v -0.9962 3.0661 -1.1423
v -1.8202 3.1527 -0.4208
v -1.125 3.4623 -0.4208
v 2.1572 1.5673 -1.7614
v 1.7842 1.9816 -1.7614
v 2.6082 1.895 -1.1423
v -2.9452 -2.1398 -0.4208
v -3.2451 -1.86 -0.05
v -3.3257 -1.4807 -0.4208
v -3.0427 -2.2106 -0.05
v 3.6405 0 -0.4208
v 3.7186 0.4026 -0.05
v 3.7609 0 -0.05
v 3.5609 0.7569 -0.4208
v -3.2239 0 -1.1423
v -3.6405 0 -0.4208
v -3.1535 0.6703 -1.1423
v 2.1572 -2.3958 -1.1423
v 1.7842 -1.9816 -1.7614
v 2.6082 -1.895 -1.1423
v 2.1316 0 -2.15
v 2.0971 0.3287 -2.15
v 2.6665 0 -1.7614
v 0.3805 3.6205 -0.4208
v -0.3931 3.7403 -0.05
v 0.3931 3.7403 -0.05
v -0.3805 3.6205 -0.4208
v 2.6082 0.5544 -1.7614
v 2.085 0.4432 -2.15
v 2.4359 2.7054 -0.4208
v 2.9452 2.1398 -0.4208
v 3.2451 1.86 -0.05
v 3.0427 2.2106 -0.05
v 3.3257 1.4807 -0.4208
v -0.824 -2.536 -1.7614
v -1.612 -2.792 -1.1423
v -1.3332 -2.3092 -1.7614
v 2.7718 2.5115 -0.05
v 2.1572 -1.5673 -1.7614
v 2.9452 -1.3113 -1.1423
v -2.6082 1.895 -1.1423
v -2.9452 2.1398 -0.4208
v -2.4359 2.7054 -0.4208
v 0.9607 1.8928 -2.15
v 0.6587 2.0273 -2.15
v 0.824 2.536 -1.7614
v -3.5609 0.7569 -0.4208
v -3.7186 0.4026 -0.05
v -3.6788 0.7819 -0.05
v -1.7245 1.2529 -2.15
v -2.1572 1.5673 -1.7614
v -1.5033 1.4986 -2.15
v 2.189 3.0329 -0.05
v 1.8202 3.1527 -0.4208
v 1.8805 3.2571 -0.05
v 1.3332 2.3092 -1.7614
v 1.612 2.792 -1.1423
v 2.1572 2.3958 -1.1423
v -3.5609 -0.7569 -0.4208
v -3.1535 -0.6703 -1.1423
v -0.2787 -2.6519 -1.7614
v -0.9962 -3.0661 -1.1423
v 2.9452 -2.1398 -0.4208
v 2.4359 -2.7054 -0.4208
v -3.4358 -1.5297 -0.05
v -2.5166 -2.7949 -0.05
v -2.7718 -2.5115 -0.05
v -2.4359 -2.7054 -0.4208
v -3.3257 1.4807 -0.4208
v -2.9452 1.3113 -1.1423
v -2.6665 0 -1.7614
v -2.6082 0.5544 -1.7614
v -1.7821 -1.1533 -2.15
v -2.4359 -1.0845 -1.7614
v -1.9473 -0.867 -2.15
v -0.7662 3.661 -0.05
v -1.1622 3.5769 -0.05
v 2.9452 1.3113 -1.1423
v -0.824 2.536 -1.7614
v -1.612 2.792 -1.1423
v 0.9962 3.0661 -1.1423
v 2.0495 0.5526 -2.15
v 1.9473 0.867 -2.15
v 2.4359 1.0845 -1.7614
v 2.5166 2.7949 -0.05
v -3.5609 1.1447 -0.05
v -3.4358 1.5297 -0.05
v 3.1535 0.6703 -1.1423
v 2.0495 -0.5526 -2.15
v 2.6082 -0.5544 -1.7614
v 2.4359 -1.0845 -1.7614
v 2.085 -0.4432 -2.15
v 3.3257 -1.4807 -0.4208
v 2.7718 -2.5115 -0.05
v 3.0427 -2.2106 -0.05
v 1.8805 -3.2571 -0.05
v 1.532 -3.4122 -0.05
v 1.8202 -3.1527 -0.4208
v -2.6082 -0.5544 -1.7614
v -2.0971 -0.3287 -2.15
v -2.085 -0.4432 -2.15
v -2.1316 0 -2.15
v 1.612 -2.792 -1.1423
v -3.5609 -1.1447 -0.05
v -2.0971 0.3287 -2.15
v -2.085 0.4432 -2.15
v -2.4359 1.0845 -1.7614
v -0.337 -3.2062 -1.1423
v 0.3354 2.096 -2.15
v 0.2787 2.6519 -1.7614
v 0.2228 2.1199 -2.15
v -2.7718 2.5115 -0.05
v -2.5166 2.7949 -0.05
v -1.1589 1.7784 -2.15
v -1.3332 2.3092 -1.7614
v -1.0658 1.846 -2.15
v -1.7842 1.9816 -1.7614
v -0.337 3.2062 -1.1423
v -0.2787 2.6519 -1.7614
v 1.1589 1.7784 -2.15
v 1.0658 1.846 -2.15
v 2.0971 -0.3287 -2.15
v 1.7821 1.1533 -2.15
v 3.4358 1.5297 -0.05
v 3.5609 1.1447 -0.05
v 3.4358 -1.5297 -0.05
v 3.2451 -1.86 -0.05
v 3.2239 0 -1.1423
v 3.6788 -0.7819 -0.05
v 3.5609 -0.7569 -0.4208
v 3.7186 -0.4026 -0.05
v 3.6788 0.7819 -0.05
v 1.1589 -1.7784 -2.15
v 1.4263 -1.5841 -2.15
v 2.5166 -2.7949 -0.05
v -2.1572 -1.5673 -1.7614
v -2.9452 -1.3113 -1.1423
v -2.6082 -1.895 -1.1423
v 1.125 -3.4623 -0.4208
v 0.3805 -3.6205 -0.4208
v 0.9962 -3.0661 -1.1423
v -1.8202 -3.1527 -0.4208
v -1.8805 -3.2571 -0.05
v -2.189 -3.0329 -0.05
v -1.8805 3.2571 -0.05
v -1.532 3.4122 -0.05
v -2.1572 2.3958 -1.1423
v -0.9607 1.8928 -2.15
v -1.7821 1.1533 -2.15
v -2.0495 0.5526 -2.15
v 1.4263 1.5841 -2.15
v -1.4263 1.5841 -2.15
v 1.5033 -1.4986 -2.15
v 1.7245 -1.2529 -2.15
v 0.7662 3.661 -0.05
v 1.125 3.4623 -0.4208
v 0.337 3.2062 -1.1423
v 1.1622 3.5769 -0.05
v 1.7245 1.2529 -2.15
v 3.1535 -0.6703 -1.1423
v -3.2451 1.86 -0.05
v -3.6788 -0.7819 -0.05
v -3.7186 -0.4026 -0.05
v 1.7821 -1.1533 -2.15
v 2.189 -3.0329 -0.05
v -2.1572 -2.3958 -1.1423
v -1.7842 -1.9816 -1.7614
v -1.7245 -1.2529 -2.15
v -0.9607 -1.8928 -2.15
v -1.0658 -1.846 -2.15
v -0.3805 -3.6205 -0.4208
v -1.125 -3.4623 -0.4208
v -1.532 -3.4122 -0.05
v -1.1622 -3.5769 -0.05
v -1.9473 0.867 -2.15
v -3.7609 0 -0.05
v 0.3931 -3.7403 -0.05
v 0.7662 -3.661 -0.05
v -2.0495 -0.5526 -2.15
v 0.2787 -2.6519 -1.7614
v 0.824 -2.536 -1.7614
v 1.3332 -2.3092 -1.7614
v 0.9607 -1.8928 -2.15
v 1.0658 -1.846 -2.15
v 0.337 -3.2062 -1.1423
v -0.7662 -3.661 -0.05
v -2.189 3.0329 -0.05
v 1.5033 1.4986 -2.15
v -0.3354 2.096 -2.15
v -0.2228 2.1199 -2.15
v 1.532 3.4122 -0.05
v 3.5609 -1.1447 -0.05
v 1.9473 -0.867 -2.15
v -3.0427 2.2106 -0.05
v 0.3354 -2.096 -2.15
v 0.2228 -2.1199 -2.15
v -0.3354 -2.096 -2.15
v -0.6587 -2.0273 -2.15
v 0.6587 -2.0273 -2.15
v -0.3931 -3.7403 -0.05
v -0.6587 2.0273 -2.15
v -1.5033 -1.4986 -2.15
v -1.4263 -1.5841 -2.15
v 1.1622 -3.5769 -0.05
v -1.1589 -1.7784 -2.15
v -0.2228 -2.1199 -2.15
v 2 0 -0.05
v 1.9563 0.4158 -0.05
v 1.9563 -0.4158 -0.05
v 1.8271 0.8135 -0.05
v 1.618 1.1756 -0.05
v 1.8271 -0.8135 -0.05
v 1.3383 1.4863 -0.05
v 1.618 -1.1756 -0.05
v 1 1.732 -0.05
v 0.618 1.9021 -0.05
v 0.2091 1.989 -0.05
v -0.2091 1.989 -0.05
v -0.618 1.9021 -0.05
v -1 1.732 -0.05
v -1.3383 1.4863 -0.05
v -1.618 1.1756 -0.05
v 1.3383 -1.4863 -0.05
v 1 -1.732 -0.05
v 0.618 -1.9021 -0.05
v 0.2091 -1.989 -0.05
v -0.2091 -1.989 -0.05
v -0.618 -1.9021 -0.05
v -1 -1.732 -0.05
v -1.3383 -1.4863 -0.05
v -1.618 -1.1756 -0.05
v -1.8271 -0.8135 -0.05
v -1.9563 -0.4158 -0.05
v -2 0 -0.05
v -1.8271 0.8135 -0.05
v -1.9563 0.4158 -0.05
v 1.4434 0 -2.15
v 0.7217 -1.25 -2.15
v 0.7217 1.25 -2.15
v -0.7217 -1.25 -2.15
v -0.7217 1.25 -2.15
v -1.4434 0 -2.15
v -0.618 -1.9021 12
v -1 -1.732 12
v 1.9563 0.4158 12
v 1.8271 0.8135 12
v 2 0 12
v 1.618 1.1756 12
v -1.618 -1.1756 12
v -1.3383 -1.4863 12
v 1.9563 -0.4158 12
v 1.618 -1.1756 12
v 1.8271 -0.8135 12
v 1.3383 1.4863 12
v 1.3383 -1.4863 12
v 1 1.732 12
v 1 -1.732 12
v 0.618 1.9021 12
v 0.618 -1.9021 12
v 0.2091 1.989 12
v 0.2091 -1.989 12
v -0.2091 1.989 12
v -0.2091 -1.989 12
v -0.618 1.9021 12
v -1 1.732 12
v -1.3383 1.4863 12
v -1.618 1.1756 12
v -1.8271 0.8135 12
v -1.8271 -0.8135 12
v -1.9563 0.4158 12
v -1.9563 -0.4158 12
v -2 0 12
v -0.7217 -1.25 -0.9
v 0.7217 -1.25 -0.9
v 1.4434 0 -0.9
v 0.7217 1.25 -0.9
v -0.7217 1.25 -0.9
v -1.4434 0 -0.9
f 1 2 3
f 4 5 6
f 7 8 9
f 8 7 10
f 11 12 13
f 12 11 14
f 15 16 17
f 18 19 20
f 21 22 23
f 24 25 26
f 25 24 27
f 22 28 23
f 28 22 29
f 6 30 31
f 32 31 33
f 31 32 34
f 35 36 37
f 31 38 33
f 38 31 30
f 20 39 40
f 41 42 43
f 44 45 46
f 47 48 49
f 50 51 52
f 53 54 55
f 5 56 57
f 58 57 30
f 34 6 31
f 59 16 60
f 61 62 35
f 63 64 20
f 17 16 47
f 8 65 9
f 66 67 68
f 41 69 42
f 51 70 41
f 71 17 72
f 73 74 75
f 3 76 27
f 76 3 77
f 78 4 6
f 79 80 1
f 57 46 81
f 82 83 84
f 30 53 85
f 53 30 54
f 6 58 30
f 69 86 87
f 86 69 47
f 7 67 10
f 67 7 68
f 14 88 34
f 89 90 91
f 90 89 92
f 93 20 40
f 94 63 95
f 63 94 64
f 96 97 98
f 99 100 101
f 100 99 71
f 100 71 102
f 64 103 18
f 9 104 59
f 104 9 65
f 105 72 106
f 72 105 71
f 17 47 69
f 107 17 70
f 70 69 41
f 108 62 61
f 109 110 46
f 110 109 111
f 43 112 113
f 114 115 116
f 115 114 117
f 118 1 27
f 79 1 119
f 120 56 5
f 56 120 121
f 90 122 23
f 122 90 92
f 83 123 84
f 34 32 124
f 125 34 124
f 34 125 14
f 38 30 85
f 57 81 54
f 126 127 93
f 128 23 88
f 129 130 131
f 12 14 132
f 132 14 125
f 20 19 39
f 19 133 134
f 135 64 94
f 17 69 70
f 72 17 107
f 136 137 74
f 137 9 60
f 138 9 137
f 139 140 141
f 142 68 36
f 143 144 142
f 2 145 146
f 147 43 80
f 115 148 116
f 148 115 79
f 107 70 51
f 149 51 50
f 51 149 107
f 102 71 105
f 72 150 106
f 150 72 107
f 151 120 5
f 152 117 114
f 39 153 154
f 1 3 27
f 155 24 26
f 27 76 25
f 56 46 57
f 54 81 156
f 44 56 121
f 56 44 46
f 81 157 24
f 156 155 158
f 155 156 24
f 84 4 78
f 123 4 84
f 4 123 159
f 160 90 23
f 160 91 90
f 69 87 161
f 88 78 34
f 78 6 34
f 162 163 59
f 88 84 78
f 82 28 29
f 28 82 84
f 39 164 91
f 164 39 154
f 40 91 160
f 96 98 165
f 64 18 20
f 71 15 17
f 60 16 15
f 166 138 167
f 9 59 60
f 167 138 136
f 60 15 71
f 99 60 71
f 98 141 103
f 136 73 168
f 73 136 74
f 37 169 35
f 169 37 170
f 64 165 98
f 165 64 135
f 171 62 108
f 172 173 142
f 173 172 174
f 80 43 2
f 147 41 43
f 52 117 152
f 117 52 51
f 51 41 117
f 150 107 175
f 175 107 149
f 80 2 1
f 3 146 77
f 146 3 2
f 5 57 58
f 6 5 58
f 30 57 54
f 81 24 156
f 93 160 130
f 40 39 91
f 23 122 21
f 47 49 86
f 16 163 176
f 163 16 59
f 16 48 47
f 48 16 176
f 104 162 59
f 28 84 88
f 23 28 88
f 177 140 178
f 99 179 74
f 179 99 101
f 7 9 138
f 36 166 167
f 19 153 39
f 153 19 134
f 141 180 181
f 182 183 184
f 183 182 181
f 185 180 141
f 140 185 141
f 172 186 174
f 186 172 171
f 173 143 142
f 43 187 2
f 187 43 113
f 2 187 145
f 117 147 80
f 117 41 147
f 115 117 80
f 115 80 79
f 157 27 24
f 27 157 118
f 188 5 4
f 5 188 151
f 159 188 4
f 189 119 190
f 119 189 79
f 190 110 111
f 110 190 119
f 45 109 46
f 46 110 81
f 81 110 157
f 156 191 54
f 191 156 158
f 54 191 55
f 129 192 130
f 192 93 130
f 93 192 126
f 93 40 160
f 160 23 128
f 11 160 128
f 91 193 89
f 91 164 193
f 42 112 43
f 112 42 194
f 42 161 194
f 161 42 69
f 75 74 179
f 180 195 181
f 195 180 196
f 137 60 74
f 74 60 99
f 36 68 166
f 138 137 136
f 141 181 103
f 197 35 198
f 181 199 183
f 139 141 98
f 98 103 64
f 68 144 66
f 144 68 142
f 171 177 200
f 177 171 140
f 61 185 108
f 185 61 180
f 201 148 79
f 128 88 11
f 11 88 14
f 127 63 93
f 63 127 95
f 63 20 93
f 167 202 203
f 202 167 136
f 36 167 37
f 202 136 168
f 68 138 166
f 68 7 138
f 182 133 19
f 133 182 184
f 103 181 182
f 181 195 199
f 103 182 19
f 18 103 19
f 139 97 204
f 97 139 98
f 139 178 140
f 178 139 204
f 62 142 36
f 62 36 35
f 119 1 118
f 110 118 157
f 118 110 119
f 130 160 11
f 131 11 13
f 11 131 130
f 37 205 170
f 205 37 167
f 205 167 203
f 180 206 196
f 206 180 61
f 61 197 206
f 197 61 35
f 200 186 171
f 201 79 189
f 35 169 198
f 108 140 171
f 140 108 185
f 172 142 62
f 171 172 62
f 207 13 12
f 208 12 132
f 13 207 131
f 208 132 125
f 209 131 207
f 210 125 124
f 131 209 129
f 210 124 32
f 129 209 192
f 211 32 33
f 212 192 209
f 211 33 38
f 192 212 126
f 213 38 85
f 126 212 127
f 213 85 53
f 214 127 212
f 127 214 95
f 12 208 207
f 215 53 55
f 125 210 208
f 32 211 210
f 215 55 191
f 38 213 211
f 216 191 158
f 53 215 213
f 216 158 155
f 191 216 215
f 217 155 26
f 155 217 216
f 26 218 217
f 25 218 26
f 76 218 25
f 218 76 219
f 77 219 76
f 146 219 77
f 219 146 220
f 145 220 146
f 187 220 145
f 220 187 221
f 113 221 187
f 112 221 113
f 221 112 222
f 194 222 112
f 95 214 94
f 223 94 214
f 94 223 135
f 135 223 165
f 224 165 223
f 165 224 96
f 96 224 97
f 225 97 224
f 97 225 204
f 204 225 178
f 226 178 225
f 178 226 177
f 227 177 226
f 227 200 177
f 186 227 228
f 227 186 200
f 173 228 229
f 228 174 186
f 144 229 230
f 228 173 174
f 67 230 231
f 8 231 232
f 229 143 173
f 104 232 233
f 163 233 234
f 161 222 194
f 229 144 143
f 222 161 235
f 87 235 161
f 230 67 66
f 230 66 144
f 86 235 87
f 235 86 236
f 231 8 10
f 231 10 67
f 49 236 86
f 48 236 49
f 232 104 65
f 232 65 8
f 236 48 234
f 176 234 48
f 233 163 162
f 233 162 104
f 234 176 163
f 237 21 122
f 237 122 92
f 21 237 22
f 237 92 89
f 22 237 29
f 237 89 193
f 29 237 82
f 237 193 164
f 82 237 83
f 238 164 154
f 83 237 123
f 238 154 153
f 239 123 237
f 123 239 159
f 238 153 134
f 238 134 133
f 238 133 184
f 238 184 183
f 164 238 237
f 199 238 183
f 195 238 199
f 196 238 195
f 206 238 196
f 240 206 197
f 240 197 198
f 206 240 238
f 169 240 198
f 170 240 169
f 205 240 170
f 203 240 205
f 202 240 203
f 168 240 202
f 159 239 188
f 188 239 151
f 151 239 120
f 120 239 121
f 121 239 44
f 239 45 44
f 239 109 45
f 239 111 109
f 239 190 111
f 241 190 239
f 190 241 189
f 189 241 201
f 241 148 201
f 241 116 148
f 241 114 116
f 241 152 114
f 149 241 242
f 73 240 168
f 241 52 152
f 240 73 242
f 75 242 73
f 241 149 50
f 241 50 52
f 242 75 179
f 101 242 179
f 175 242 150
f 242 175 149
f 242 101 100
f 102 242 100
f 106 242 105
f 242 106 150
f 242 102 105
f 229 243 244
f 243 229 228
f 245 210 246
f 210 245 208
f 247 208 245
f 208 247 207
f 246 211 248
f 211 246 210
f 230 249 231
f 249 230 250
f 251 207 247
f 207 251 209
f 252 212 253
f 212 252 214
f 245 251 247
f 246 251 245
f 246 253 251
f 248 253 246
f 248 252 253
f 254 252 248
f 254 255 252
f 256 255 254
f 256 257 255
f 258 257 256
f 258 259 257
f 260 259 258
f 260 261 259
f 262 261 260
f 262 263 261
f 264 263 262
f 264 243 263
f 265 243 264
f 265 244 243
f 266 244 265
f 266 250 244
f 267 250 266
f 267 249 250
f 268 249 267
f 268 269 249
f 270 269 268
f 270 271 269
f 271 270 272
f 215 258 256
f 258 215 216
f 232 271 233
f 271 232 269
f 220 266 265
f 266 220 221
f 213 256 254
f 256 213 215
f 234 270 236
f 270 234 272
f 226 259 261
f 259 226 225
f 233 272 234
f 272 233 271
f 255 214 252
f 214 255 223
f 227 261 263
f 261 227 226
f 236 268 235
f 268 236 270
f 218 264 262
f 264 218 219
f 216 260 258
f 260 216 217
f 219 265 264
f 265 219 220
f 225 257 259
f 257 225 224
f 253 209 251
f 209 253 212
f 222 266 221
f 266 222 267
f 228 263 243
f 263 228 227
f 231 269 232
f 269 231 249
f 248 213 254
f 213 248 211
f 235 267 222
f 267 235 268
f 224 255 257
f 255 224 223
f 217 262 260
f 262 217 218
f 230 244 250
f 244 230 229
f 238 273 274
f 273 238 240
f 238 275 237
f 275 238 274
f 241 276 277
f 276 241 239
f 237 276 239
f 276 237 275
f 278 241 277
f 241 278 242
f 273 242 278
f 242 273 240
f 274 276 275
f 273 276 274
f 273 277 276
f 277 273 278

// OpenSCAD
/*
   Copyright 2018 Scott Bezek and the splitflap contributors

   Licensed under the Apache License, Version 2.0 (the "License");
   you may not use this file except in compliance with the License.
   You may obtain a copy of the License at

       http://www.apache.org/licenses/LICENSE-2.0

   Unless required by applicable law or agreed to in writing, software
   distributed under the License is distributed on an "AS IS" BASIS,
   WITHOUT WARRANTIES OR CONDITIONS OF ANY KIND, either express or implied.
   See the License for the specific language governing permissions and
   limitations under the License.
*/

module roughM4_7380(length) {
    eps = 0.1;
    thread_diameter = 4;
    head_diameter = 7.6;
    head_length = 2.2;
    driving_depth = 1.3;
    driving_apothem = 2.5/2;
    driving_radius = driving_apothem / cos(180/6);

    sphere_offset = 1.2;  // Just a guess
    sphere_radius = sqrt(sphere_offset*sphere_offset + (head_diameter/2)*(head_diameter/2));


    difference() {
        union() {
            translate([0, 0, -eps]) {
                cylinder(h=length+eps, d=thread_diameter, $fn=30);
            }
            difference() {
                translate([0, 0, sphere_offset]) {
                    sphere(sphere_radius, $fn=30);
                }
                translate([0, 0, sphere_radius]) {
                    cube([sphere_radius*2 + eps, sphere_radius*2 + eps, sphere_radius*2 + eps], center=true);
                }
                translate([0, 0, -sphere_radius - head_length]) {
                    cube([sphere_radius*2 + eps, sphere_radius*2 + eps, sphere_radius*2 + eps], center=true);
                }
            }
        }
        translate([0, 0, -head_length-eps]) {
            cylinder(h=driving_depth+eps, r=driving_radius, $fn=6);
        }
    }
}

roughM4_7380(12);

        module color_selector(c) {
            precision = 0.0000001;  // arbitrary
            function compare_floats(x, y, i=0) = 
                  (len(x) != len(y)) ? false  // if arrays differ in length, they can't be equal
                : (i >= len(x)) ? true  // if we've hit the end of the arrays without issue, we're equal
                : (x[i] - precision <= y[i]) && x[i] + precision >= y[i]
                    ? compare_floats(x, y, i+1)
                    : false;  // not equal, short circuit

            if (c == [0.68172, 0.537, 0.3759] || compare_floats(c, [0.68172, 0.537, 0.3759]))
                children();
        }
                    
